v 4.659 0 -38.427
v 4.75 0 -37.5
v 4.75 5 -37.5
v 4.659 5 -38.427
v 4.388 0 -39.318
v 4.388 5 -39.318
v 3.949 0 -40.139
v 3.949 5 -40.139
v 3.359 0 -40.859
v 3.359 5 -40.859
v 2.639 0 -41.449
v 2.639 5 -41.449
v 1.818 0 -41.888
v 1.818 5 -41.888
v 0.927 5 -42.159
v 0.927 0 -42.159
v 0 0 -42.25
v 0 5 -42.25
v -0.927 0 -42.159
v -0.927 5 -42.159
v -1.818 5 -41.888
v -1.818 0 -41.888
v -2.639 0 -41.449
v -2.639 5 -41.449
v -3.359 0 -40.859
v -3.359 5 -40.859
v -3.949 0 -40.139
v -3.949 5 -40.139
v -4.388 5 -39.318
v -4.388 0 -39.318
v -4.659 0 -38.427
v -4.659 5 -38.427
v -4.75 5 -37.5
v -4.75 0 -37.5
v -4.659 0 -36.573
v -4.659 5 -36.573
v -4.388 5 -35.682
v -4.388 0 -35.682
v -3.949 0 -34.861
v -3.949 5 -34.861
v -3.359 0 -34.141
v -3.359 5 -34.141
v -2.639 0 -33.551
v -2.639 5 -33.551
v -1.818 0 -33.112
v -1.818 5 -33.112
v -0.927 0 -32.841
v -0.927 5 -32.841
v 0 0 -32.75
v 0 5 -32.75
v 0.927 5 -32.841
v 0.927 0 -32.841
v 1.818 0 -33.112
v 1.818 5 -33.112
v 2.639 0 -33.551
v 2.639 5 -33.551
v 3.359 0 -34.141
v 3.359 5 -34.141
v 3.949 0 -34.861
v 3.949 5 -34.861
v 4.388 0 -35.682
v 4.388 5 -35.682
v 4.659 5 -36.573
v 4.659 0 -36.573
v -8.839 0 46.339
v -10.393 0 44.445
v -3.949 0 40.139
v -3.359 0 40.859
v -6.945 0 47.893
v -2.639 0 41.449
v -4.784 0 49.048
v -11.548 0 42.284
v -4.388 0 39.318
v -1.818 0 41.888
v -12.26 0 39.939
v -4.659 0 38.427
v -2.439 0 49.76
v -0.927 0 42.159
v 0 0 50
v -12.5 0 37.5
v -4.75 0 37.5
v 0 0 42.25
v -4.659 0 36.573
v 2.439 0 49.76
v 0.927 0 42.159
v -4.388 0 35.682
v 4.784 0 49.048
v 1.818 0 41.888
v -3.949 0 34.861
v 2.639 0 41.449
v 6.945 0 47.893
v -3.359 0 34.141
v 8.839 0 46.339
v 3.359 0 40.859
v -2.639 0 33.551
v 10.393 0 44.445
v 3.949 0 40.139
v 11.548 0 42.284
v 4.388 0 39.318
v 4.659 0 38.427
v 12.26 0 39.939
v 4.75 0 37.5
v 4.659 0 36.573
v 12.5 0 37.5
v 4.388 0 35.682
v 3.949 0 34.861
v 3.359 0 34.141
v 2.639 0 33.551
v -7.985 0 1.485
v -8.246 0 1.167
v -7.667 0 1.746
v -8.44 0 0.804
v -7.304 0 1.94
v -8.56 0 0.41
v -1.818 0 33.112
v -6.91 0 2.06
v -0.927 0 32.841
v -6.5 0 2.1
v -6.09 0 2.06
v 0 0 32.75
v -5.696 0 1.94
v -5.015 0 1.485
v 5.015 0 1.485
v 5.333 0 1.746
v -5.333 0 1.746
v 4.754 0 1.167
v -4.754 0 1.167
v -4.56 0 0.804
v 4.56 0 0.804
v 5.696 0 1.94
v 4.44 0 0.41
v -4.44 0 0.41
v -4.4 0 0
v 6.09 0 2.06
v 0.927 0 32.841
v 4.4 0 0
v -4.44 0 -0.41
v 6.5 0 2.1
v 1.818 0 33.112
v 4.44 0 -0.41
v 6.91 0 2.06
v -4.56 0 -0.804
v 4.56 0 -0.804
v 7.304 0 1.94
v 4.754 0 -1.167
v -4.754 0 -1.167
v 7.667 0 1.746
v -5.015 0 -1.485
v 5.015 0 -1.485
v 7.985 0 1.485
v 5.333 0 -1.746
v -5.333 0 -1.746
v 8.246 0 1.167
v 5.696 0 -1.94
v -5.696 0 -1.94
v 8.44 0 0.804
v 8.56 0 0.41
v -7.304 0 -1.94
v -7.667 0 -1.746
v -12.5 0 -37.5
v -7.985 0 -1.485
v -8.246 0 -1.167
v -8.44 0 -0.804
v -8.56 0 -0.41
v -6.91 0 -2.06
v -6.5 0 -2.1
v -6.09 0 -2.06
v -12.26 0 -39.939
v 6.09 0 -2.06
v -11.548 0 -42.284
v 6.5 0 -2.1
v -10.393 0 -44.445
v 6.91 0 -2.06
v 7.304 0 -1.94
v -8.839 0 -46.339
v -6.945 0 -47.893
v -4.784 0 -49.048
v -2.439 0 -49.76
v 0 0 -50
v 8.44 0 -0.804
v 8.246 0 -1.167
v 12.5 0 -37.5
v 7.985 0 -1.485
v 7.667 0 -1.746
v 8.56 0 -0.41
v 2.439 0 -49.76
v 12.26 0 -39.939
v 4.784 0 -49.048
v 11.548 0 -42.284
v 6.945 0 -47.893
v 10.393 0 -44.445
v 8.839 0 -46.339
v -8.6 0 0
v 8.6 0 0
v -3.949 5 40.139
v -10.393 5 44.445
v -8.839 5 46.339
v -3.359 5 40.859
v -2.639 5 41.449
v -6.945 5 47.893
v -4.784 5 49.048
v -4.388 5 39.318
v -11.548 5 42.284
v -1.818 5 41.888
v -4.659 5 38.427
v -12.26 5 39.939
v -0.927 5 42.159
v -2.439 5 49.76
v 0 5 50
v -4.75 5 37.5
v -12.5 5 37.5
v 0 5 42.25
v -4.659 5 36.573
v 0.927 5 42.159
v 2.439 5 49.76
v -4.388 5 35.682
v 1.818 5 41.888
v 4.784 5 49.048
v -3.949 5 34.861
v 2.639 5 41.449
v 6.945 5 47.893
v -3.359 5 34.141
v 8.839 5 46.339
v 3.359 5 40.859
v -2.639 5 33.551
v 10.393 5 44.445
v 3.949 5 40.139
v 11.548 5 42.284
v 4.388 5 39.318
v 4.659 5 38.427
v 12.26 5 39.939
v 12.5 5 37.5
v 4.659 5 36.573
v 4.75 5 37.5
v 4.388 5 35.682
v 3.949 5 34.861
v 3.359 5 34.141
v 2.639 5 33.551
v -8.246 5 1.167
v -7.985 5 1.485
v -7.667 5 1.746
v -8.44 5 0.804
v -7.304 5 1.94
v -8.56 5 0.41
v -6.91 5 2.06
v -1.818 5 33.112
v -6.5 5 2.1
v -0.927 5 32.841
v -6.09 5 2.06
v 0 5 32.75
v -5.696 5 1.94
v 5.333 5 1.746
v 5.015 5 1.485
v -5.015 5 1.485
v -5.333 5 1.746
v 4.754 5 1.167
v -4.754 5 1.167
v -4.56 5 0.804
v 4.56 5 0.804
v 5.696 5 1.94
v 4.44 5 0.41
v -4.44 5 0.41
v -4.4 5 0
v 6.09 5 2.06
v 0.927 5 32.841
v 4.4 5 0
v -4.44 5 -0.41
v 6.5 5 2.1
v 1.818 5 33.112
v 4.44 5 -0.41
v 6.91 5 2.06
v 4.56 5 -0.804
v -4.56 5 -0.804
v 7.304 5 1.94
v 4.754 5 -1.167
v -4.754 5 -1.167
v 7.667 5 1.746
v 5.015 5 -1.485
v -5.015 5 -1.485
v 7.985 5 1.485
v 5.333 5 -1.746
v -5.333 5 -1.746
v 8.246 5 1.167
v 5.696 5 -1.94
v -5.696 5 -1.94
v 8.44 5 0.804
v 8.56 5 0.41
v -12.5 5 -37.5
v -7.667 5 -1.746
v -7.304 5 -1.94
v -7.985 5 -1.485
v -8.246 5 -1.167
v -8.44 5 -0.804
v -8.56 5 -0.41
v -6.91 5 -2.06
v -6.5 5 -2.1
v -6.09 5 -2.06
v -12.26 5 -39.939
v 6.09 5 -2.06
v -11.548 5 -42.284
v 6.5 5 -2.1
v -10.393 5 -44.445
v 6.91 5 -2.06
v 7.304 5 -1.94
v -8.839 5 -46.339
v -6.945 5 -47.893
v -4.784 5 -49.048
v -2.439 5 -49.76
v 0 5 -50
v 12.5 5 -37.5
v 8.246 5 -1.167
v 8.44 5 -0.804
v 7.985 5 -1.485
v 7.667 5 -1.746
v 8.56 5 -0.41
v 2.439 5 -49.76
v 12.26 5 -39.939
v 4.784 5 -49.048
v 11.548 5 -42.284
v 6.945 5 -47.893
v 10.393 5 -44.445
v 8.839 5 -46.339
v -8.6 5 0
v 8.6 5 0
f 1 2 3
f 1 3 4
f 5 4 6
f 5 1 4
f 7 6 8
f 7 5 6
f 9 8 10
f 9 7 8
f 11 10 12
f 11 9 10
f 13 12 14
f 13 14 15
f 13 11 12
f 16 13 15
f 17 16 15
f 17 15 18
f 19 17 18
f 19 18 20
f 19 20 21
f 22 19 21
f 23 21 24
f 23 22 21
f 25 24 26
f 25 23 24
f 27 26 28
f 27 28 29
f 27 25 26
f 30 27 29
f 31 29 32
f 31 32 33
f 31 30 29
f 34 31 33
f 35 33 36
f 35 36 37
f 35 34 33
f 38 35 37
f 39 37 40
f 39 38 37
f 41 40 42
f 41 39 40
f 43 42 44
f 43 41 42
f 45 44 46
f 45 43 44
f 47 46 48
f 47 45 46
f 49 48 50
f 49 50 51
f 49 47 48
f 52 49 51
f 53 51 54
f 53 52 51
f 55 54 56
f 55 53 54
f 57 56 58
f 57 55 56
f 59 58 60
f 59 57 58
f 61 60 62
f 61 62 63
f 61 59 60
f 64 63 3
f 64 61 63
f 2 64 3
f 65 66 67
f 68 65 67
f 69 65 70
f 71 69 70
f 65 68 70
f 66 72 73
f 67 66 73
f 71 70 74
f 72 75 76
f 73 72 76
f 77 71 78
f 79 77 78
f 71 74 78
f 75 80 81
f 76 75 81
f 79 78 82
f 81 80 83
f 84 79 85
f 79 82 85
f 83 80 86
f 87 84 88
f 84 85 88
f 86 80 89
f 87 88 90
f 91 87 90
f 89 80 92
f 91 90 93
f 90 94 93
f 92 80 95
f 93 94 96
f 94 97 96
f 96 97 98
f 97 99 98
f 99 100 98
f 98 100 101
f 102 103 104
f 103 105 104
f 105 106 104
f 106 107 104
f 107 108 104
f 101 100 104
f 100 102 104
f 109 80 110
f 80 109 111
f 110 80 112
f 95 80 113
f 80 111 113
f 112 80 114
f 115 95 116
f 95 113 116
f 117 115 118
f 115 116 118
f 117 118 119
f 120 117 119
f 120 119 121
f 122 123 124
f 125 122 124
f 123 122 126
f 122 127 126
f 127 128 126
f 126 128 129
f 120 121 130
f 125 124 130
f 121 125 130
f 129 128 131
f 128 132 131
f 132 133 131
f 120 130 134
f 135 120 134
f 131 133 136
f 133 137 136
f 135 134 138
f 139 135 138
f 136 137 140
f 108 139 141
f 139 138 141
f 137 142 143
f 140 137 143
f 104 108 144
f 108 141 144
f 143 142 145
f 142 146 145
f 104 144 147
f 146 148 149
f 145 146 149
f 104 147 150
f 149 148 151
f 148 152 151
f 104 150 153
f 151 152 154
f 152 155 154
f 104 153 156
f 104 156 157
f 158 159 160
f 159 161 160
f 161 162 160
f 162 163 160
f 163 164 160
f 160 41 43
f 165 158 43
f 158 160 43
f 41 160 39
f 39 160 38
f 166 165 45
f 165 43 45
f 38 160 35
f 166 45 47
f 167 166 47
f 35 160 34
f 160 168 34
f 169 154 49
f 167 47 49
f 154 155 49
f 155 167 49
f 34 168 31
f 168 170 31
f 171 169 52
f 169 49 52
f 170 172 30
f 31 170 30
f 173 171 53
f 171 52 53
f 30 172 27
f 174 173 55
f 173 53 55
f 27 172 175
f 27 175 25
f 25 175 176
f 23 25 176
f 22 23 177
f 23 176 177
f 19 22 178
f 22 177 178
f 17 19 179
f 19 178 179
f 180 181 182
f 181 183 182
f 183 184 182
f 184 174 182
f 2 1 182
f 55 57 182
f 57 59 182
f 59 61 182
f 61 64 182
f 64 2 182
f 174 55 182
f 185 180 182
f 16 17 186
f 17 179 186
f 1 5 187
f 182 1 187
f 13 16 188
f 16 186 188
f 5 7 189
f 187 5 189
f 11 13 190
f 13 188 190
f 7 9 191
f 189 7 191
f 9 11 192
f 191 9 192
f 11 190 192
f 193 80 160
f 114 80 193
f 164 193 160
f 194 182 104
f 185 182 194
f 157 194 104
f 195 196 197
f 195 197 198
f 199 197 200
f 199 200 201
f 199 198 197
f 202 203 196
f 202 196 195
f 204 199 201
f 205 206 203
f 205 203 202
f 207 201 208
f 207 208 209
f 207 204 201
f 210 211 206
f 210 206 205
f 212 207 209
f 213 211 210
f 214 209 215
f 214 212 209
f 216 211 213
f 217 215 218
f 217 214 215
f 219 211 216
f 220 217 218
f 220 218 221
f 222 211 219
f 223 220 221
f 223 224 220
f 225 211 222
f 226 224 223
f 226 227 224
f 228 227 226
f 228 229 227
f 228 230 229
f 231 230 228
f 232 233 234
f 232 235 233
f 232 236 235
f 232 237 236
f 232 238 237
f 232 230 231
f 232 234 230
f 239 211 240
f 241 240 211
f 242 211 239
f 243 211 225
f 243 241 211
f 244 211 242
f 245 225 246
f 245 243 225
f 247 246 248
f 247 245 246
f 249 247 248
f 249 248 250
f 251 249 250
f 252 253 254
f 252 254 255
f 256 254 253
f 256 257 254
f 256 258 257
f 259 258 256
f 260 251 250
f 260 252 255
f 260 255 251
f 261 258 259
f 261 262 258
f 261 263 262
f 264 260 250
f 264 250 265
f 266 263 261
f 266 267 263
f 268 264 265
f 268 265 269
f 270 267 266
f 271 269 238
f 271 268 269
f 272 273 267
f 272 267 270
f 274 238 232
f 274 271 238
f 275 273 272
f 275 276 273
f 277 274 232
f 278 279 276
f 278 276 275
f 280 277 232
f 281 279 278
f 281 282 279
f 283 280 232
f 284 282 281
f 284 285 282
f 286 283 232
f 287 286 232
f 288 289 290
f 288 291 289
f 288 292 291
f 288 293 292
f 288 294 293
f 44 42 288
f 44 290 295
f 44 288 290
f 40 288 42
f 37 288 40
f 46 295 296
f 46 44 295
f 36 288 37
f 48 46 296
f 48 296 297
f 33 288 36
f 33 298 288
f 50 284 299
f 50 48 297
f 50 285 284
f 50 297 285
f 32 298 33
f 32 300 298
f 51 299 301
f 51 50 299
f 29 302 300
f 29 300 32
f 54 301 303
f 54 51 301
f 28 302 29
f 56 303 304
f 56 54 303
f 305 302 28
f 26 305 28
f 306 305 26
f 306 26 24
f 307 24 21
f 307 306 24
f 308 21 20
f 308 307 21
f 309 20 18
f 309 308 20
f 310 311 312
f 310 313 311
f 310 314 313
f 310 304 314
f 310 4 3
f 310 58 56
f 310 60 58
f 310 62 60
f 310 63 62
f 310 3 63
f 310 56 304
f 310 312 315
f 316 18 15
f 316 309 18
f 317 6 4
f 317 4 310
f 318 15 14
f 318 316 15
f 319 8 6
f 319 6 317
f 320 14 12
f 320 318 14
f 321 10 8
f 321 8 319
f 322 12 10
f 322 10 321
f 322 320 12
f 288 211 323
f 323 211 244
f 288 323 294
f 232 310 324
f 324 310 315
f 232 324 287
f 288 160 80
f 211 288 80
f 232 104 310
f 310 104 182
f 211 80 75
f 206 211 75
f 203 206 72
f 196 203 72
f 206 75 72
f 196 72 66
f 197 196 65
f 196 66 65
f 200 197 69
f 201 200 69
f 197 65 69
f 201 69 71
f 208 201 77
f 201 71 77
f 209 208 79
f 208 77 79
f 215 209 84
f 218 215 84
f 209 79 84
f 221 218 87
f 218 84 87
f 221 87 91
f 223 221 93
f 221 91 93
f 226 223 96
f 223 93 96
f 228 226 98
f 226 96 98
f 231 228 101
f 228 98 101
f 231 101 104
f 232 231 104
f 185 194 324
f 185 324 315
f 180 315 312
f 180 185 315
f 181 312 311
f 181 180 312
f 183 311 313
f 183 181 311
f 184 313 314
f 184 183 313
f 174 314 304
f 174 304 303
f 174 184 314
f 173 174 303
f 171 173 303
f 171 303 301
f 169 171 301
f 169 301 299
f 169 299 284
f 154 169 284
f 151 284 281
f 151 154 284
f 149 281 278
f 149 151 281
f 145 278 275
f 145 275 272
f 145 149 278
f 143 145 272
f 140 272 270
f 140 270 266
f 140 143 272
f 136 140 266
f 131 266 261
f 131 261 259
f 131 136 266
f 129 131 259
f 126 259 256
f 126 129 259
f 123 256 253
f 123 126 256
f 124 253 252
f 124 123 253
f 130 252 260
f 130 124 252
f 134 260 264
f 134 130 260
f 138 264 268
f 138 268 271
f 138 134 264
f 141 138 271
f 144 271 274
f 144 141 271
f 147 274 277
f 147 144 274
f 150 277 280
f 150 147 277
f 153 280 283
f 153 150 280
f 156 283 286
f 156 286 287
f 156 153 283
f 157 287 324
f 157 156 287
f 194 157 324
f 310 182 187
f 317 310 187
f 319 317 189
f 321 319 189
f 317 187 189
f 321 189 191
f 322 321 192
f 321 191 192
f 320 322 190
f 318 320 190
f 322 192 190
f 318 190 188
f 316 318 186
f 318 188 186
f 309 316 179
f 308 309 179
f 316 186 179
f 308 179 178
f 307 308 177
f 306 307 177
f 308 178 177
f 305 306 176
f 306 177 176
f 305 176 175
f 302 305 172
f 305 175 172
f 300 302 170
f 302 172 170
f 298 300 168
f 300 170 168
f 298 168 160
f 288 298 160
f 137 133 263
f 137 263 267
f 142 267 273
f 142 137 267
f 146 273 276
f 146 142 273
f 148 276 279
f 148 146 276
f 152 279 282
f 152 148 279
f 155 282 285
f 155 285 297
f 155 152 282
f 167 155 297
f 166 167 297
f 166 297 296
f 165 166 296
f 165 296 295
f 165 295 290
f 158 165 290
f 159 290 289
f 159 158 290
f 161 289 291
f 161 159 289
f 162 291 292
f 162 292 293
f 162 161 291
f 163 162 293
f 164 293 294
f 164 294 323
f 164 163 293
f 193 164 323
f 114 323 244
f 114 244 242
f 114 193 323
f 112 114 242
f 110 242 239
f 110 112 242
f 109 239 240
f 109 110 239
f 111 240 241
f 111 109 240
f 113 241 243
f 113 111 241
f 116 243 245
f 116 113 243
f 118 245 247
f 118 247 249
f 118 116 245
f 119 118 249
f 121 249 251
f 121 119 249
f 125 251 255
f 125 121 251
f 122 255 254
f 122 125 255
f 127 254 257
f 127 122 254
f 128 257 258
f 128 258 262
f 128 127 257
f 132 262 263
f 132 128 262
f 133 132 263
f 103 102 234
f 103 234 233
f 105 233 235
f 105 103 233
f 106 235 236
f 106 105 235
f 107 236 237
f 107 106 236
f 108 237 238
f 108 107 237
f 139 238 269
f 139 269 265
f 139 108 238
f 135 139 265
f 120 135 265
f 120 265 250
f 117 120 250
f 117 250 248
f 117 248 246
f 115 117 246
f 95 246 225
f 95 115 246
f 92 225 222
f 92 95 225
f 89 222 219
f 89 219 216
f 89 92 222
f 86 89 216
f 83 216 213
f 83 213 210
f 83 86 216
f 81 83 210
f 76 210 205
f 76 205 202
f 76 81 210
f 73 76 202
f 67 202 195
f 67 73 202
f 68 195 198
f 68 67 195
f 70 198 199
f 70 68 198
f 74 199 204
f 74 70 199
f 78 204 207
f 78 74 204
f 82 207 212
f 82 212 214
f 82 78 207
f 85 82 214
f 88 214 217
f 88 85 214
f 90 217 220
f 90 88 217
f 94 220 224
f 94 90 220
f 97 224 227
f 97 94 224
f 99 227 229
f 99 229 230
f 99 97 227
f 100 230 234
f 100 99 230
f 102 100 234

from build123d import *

# Parameters (mm, degrees)
SKETCH1_R           = 12.5
SKETCH1_R_2         = 4.75
SKETCH1_R_3         = 2.1
BOSS_EXTRUDE1_DEPTH = 5


with BuildPart() as part:
    # Sketch1 → Boss-Extrude1 (new body)
    with BuildSketch(Plane(origin=(0, 0, 0), x_dir=(1, 0, 0), z_dir=(0, 1, 0))):
        with Locations((0, 37.5)):
            Circle(SKETCH1_R)
        with Locations((0, 37.5)):
            Circle(SKETCH1_R_2, mode=Mode.SUBTRACT)
        with BuildLine():
            ThreePointArc((-12.5, -37.5), (0, -25), (12.5, -37.5))
            Line((12.5, -37.5), (12.5, 37.5))
            ThreePointArc((12.5, 37.5), (4.5e-08, 25), (-12.5, 37.49999991))
            Line((-12.5, 37.49999991), (-12.5, -37.5))
        make_face()
        with Locations((-6.5, 0)):
            Circle(SKETCH1_R_3, mode=Mode.SUBTRACT)
        with Locations((6.5, 0)):
            Circle(SKETCH1_R_3, mode=Mode.SUBTRACT)
        with Locations((0, -37.5)):
            Circle(SKETCH1_R)
        with Locations((0, -37.5)):
            Circle(SKETCH1_R_2, mode=Mode.SUBTRACT)
    extrude(amount=BOSS_EXTRUDE1_DEPTH)


solid = part.part
